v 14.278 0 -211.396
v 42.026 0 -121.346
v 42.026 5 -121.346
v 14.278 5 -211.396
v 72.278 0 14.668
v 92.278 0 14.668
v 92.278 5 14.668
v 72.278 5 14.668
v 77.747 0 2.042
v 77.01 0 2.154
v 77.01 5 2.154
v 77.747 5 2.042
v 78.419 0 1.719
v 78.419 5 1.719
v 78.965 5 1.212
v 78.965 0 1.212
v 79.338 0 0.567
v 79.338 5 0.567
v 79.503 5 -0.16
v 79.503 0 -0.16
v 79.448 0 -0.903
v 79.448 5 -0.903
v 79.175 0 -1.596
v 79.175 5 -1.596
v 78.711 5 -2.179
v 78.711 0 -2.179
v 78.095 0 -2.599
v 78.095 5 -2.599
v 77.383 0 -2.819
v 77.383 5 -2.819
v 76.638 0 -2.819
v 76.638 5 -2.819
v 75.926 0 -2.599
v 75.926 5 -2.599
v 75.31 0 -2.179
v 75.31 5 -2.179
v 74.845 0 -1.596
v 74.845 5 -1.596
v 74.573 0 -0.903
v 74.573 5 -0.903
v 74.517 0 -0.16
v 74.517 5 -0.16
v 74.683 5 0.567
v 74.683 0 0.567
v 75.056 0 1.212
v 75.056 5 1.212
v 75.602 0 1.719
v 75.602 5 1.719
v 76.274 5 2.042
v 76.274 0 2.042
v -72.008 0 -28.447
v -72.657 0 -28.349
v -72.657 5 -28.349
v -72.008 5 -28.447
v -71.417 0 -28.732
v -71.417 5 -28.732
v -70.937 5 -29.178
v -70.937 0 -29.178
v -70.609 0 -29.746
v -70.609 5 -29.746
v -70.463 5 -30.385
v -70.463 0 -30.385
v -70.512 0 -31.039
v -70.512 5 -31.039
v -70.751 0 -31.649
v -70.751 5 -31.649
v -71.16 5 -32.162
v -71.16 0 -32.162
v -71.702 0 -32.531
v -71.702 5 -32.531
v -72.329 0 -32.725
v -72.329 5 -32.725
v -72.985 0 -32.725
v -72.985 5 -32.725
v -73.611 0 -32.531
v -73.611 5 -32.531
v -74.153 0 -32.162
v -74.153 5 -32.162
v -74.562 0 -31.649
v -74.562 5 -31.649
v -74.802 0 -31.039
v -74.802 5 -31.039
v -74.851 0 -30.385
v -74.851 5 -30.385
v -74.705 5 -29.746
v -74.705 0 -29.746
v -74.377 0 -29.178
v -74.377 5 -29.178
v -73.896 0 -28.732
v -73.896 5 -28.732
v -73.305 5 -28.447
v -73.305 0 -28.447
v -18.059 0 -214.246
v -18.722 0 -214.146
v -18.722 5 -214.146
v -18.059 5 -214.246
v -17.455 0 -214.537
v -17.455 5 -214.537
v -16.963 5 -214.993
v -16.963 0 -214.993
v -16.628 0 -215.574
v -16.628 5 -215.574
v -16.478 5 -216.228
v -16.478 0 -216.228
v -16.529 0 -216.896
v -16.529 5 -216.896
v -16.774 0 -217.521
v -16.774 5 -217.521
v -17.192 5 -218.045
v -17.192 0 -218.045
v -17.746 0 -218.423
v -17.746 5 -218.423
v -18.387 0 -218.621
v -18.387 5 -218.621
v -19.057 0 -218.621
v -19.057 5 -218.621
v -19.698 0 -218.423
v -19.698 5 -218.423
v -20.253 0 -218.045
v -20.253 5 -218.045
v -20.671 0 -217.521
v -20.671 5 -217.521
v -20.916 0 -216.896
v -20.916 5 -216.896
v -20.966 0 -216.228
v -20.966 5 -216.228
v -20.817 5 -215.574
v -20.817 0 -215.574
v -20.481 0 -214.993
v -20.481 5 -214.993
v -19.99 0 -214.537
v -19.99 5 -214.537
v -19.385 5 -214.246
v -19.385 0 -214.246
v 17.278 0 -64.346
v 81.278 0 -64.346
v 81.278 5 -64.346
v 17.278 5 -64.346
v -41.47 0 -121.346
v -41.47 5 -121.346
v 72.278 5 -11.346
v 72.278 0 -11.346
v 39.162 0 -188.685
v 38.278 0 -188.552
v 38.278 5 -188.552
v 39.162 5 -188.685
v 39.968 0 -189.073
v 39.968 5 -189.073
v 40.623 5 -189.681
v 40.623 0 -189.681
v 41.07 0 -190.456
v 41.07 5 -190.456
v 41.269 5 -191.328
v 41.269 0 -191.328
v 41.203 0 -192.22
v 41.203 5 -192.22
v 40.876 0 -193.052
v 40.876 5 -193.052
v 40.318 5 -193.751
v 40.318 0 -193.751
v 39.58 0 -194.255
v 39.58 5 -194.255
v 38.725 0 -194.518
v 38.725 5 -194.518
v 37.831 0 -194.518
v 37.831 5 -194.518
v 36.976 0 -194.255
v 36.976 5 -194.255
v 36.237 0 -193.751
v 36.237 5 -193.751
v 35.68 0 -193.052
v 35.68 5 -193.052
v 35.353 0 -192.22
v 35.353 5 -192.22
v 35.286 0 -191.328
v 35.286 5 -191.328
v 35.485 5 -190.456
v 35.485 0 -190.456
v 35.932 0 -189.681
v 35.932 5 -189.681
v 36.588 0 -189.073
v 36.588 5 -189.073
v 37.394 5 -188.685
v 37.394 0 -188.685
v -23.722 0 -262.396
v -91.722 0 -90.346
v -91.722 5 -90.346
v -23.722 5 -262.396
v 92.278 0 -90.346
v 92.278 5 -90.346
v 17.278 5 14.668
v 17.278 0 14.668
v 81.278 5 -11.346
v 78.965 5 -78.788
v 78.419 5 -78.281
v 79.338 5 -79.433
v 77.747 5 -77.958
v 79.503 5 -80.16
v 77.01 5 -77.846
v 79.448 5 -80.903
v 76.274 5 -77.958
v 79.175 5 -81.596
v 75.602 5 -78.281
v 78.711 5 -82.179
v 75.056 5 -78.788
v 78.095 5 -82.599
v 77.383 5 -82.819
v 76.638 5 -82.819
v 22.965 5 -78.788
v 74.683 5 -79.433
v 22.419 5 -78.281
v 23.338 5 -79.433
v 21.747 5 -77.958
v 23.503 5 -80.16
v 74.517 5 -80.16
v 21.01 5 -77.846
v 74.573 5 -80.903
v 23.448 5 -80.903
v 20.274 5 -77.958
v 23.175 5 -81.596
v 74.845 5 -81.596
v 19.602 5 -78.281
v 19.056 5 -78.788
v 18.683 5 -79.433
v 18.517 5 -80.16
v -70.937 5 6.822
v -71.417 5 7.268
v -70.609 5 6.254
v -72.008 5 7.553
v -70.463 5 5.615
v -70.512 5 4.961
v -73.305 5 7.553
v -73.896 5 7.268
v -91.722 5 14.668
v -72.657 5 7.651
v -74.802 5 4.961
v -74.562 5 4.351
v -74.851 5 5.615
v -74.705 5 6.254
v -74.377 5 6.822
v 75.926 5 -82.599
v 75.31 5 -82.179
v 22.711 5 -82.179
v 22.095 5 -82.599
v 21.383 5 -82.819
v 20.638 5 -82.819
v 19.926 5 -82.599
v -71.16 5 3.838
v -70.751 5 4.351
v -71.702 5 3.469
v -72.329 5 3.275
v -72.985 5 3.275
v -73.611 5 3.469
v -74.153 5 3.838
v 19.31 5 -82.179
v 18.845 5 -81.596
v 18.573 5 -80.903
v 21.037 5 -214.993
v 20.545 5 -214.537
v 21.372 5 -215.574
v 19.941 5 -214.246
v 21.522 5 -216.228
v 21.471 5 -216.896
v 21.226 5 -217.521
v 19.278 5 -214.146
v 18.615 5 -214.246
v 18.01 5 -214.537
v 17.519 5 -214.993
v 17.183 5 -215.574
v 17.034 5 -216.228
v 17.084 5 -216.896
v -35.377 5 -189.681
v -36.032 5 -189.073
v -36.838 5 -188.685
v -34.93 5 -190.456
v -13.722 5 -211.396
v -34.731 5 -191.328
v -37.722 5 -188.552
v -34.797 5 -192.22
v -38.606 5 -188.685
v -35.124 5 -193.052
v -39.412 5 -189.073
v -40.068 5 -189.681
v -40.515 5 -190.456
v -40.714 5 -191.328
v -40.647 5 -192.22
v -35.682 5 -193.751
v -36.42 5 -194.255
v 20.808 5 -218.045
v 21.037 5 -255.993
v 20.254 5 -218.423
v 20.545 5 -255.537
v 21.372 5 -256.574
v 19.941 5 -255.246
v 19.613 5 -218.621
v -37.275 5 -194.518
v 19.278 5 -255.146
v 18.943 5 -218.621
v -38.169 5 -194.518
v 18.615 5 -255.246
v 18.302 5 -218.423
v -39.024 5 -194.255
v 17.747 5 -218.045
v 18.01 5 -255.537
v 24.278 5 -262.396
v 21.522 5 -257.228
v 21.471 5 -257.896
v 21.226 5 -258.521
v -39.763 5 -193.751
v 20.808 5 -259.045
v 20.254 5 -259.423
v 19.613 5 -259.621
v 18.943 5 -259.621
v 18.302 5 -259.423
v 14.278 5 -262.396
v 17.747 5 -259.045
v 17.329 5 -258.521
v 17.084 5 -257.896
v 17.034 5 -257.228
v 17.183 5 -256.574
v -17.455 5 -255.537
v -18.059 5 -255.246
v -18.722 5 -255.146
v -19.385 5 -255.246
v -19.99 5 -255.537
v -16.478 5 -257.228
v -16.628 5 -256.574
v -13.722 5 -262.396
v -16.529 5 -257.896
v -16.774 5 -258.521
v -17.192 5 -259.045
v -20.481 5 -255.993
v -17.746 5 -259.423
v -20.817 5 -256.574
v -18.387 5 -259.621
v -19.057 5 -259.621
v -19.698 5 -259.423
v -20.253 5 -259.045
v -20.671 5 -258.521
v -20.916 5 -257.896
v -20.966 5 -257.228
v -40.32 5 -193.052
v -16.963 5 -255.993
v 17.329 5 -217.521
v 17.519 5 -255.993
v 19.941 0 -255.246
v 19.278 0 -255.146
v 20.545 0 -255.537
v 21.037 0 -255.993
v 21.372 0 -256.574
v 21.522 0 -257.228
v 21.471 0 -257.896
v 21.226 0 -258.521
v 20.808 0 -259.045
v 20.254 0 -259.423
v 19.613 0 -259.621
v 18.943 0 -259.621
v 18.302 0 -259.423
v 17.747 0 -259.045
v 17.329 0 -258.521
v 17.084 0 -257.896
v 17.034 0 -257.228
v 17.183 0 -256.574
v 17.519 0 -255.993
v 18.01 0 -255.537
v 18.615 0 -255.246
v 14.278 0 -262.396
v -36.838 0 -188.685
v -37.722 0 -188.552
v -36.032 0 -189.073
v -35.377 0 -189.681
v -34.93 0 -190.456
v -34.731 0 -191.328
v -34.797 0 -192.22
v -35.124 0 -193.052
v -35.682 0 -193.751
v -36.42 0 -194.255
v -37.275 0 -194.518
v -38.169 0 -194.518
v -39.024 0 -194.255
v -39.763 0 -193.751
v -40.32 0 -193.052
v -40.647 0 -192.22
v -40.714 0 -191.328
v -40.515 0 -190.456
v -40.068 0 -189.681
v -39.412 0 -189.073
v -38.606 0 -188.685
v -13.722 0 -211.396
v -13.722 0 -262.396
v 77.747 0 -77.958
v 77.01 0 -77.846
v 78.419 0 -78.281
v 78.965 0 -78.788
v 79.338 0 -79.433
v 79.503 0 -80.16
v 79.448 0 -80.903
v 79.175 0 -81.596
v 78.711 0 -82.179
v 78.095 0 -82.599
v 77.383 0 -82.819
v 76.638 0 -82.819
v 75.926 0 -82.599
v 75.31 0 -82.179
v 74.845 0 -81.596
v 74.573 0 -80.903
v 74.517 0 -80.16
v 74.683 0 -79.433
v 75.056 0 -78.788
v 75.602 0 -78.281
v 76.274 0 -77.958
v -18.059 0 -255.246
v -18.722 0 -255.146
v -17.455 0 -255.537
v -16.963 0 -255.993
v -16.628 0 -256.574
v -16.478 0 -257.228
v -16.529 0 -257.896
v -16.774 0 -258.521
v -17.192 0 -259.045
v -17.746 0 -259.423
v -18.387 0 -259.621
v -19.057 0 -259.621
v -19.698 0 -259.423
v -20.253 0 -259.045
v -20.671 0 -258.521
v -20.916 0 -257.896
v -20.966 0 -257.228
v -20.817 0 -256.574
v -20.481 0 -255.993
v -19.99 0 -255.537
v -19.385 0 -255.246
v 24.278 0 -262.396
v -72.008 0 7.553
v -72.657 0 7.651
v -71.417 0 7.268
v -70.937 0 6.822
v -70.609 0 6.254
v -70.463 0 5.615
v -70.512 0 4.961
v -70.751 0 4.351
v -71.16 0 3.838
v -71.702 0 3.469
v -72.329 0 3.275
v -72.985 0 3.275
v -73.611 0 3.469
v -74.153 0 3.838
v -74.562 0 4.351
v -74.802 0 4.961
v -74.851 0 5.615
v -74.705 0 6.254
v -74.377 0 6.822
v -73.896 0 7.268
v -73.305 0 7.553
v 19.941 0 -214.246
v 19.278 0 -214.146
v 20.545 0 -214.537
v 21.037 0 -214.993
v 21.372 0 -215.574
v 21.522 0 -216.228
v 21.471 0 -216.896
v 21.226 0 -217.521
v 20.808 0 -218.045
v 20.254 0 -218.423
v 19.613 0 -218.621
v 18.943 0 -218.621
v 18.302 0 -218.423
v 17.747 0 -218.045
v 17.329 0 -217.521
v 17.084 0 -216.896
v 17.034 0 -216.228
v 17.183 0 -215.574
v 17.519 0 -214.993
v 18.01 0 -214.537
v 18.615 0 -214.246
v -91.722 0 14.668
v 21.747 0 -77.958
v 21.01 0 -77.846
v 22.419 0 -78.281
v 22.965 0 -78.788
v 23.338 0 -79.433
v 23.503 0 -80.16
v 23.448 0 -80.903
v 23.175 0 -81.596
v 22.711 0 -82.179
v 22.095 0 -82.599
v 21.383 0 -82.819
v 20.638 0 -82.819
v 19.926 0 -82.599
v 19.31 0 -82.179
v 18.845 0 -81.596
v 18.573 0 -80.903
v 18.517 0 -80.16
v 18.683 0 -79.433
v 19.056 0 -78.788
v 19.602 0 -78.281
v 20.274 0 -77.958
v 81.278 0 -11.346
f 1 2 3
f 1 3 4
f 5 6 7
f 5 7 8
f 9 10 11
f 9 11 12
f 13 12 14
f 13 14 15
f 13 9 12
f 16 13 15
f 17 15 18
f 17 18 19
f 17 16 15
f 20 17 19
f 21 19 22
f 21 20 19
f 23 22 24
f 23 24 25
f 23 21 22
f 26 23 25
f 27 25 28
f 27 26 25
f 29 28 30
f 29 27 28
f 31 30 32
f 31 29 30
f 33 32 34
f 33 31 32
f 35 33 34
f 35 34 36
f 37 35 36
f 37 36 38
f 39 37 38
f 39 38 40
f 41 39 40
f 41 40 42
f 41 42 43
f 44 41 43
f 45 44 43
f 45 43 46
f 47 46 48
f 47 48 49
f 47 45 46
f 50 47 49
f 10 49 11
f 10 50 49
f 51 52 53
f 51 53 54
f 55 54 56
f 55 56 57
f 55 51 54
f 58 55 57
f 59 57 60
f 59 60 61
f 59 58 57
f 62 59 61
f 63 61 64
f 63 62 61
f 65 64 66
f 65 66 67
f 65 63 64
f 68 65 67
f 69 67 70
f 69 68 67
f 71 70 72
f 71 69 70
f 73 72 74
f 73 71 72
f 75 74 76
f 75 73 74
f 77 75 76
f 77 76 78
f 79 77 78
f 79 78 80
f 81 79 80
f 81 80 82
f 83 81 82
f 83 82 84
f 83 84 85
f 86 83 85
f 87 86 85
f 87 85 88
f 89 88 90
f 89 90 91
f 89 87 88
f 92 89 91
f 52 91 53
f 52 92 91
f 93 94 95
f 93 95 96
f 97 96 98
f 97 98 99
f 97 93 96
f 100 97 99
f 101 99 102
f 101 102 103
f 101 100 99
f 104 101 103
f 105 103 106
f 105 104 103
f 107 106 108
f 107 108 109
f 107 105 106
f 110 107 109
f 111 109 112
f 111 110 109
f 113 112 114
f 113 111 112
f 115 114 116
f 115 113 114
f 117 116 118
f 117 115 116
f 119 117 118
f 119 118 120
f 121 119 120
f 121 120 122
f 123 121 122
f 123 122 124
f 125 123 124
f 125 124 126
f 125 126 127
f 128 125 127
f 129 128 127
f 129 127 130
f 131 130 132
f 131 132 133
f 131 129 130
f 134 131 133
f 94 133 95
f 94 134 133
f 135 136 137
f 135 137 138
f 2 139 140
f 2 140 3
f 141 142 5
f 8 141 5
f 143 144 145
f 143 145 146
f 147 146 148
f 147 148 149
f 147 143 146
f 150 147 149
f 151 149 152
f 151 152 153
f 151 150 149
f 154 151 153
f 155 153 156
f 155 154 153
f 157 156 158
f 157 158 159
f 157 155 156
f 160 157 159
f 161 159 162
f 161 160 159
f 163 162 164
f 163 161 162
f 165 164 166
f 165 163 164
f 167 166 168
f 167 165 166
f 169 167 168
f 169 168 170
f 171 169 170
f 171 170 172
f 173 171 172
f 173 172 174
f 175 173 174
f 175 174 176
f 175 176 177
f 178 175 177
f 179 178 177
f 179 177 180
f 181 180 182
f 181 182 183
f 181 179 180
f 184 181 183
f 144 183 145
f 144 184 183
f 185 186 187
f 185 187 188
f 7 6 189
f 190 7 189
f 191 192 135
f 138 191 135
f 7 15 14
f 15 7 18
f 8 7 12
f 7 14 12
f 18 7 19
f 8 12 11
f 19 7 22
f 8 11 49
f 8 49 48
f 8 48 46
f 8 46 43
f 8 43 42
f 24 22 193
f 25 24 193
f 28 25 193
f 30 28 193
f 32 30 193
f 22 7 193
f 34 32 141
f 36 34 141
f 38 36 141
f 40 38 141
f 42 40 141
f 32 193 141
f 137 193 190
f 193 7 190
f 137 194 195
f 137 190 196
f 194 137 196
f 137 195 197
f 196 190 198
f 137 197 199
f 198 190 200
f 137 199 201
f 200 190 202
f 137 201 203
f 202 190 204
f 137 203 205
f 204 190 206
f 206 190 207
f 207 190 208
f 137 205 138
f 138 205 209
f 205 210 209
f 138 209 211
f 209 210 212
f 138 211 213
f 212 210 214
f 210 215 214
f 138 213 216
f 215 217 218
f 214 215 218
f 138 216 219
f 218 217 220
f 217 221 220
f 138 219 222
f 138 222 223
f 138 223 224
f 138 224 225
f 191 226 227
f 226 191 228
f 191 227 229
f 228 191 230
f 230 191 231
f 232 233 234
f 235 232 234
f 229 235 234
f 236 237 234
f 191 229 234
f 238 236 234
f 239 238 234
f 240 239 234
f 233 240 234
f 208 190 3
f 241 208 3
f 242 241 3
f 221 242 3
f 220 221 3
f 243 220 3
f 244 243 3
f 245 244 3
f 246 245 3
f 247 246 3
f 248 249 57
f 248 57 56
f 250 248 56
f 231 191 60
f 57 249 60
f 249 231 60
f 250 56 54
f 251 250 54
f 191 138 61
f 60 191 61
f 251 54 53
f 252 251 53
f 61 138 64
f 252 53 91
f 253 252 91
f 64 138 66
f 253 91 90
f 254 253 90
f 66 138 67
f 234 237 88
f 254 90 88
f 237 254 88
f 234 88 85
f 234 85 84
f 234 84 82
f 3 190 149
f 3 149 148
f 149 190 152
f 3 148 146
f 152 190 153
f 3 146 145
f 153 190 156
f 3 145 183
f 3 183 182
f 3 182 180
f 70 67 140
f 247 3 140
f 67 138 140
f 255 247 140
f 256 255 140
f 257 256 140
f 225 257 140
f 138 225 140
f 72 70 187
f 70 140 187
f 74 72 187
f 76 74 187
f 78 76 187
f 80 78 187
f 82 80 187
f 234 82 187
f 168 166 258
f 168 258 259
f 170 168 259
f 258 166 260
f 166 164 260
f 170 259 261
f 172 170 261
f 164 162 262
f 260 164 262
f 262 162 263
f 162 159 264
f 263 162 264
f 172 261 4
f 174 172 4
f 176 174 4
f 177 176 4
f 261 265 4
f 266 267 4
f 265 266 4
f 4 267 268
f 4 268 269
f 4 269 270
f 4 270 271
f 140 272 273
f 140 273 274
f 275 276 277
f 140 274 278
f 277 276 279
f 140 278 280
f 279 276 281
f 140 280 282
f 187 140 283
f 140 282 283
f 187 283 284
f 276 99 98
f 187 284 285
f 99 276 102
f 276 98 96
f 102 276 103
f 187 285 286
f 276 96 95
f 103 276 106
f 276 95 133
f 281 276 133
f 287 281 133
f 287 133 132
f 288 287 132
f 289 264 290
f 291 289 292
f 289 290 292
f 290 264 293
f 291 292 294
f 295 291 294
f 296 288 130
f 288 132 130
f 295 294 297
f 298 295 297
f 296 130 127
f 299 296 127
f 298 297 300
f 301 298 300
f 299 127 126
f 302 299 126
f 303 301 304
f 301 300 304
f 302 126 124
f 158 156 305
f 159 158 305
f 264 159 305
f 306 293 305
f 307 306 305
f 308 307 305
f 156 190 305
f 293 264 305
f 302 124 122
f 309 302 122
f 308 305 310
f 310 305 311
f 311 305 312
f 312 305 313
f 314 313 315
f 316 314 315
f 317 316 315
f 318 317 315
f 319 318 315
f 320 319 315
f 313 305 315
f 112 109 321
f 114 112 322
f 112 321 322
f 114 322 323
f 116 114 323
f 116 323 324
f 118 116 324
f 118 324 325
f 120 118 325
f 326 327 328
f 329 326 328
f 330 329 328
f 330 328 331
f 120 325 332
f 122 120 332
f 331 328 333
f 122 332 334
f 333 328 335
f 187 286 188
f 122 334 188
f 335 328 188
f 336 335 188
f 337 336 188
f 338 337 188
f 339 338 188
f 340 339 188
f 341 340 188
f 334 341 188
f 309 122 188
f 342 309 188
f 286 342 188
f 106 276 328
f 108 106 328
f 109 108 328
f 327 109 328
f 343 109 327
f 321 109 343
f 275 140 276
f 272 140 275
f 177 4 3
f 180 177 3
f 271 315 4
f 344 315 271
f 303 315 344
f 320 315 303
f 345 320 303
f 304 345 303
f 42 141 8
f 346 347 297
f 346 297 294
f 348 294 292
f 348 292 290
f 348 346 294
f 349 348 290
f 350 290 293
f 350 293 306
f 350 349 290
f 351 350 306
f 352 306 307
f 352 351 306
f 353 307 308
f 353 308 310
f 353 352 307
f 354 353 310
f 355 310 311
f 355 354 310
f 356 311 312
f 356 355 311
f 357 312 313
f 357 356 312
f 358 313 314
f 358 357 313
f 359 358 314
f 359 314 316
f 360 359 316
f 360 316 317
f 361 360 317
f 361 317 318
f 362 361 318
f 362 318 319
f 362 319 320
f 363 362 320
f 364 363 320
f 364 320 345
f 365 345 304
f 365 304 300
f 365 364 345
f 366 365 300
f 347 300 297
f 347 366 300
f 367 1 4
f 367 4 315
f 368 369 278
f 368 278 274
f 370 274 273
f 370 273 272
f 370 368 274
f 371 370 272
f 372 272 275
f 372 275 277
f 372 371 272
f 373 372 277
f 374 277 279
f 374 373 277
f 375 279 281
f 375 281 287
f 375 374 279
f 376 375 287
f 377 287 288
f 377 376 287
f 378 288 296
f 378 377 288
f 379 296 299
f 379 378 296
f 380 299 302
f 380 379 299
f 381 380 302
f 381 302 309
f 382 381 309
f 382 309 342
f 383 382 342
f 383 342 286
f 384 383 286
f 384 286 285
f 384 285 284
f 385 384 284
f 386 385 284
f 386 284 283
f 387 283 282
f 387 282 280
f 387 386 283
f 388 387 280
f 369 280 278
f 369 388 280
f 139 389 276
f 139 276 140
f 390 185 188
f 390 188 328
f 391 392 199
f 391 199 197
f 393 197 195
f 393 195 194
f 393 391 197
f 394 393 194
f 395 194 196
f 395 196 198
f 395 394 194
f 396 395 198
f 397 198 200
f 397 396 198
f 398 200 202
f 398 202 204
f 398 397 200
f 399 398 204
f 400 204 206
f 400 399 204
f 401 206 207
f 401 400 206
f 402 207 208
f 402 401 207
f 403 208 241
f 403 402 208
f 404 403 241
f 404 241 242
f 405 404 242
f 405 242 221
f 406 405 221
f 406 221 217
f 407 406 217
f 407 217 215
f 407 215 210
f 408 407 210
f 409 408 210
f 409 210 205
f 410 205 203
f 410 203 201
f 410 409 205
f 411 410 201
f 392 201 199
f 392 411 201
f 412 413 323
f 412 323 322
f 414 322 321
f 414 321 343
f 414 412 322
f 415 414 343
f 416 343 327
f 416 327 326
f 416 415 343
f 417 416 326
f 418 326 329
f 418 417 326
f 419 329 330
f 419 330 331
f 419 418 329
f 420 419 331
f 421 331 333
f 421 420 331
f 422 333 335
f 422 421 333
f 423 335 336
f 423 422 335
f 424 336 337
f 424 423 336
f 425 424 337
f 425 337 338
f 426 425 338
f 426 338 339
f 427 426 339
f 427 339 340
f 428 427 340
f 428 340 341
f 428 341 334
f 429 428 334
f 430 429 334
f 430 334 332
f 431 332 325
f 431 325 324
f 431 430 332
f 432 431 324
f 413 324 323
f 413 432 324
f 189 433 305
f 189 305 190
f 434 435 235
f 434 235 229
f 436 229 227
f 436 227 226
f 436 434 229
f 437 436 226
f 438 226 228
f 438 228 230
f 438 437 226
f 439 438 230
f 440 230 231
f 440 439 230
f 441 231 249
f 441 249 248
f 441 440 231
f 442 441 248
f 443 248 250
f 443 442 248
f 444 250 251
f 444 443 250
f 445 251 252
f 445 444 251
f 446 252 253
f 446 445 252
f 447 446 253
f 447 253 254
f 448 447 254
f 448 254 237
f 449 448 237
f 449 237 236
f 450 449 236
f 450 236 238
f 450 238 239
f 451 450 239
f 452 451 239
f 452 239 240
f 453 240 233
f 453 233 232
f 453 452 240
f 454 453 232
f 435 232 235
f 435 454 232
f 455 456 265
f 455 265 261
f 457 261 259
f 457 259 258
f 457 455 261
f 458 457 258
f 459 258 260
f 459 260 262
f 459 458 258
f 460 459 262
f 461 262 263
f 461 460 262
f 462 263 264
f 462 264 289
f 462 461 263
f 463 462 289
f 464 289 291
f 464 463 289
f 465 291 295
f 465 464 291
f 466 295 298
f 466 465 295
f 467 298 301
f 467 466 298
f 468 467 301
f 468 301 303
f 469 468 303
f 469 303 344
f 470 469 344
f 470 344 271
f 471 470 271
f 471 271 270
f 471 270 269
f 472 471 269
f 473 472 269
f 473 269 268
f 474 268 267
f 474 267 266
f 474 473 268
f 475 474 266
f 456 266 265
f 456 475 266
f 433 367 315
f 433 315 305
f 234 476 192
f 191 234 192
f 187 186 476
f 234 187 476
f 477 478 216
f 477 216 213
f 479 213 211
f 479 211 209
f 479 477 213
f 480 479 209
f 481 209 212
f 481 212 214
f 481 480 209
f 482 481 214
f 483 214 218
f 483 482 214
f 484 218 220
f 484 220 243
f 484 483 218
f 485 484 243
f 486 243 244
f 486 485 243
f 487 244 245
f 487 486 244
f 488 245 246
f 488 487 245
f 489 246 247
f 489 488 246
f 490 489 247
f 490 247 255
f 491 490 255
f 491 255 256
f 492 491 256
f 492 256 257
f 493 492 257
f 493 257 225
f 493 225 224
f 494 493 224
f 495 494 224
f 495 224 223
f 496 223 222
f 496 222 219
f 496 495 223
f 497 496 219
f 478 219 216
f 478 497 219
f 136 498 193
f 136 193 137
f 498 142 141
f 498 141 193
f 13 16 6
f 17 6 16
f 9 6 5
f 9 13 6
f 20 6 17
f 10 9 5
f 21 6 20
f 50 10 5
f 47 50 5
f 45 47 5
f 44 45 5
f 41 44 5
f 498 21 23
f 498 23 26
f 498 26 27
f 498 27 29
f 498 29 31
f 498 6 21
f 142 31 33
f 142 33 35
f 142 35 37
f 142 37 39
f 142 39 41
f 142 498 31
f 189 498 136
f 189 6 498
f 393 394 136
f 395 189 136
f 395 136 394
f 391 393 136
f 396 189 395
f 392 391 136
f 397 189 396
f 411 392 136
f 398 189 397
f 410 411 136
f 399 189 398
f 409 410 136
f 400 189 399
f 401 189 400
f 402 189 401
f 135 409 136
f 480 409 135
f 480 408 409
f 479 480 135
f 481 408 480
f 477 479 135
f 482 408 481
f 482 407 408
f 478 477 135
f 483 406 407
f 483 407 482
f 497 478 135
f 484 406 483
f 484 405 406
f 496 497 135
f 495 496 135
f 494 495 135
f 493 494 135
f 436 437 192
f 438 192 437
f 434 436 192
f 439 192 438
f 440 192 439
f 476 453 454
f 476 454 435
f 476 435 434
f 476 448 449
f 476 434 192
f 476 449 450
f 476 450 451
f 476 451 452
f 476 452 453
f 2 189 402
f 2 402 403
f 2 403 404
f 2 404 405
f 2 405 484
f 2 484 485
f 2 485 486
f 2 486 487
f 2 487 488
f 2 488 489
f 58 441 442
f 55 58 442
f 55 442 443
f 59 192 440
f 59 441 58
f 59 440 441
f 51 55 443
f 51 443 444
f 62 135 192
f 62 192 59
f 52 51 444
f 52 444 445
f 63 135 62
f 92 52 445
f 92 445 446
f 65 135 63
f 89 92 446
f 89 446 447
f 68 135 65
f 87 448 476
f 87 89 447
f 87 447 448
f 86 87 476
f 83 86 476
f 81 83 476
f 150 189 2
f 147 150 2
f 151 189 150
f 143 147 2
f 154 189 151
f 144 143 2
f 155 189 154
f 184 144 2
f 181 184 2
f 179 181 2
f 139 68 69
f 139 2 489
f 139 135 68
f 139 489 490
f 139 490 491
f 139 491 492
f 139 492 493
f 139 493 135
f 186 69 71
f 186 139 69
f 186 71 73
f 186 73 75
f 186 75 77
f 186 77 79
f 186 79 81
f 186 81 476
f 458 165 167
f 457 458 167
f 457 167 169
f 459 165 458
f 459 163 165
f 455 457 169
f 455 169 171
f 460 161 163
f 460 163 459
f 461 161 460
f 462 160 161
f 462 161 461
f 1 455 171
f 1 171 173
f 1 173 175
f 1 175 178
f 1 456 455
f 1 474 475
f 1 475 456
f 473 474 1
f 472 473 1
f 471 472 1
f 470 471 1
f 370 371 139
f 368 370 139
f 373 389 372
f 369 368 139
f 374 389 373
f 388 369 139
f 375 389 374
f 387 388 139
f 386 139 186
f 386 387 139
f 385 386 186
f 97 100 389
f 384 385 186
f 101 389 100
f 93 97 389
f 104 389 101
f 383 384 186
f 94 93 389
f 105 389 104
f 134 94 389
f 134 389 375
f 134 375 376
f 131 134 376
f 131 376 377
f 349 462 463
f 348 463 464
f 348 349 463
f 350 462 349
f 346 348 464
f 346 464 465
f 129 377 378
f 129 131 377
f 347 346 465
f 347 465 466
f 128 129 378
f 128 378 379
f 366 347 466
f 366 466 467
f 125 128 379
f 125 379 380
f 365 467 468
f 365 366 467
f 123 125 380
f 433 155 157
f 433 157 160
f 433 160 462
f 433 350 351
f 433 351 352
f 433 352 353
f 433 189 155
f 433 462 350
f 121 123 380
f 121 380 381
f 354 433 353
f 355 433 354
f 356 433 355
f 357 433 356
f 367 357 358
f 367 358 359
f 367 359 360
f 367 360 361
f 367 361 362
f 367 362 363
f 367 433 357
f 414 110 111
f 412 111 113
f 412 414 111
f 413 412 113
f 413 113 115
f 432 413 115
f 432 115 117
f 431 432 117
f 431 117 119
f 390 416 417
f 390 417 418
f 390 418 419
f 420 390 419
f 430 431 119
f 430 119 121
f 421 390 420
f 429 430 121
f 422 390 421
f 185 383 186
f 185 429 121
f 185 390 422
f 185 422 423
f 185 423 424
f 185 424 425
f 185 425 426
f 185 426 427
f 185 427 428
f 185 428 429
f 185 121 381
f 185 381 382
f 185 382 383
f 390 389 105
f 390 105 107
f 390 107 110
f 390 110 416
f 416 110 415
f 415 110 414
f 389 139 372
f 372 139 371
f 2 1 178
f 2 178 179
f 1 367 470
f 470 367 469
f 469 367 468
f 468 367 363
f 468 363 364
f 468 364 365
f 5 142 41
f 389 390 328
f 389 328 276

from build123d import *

# Parameters (mm, degrees)
SKETCH1_R           = 2.5
SKETCH1_R_2         = 2.25
SKETCH1_R_3         = 3
SKETCH1_R_4         = 2.2
BOSS_EXTRUDE1_DEPTH = 5


with BuildPart() as part:
    # Sketch1 → Boss-Extrude1 (new body)
    with BuildSketch(Plane(origin=(0, 0, 0), x_dir=(1, 0, 0), z_dir=(0, 1, 0))):
        Polygon((-91.72214446, -4.653561253), (-91.72214446, 90.346388656), (-23.72214446, 262.395827557), (-13.72214446, 262.395827557), (-13.72214446, 211.395827557), (-41.469832452, 121.346438747), (42.025543532, 121.346438747), (14.27785554, 211.395827557), (14.27785554, 262.395827557), (24.27785554, 262.395827557), (92.27785554, 90.346388656), (92.27785554, -4.653561253), (92.27785554, -10.433561253), (92.27785554, -14.668275992), (72.27785554, -14.668275992), (72.27785554, -10.433561253), (72.27785554, -4.653561253), (72.27785554, 11.346431169), (81.27785554, 11.346431169), (81.27785554, 64.346431169), (17.277798113, 64.346431169), (17.277798113, -4.653561253), (17.277798113, -10.433561253), (17.277798113, -14.668275992), (-91.456714597, -14.668275992), (-91.72214446, -14.668275992), (-91.72214446, -10.433561253), align=None)
        with Locations(Location((77.010414368, 0.346438747, 0), (0, 0, 270))):
            Circle(SKETCH1_R, mode=Mode.SUBTRACT)
        with Locations(Location((77.010414368, 80.346438747, 0), (0, 0, 270))):
            Circle(SKETCH1_R, mode=Mode.SUBTRACT)
        with Locations(Location((21.010414368, 80.346438747, 0), (0, 0, 270))):
            Circle(SKETCH1_R, mode=Mode.SUBTRACT)
        with Locations(Location((-18.72214446, 257.395827557, 0), (0, 0, 270))):
            Circle(SKETCH1_R_2, mode=Mode.SUBTRACT)
        with Locations(Location((-18.72214446, 216.395827557, 0), (0, 0, 270))):
            Circle(SKETCH1_R_2, mode=Mode.SUBTRACT)
        with Locations(Location((19.27785554, 257.395827557, 0), (0, 0, 270))):
            Circle(SKETCH1_R_2, mode=Mode.SUBTRACT)
        with Locations(Location((19.27785554, 216.395827557, 0), (0, 0, 270))):
            Circle(SKETCH1_R_2, mode=Mode.SUBTRACT)
        with Locations(Location((-37.72214446, 191.551940951, 0), (0, 0, 270))):
            Circle(SKETCH1_R_3, mode=Mode.SUBTRACT)
        with Locations(Location((38.27785554, 191.551940951, 0), (0, 0, 270))):
            Circle(SKETCH1_R_3, mode=Mode.SUBTRACT)
        with Locations(Location((-72.656714597, -5.450648645, 0), (0, 0, 270))):
            Circle(SKETCH1_R_4, mode=Mode.SUBTRACT)
        with Locations(Location((-72.656714597, 30.549351355, 0), (0, 0, 270))):
            Circle(SKETCH1_R_4, mode=Mode.SUBTRACT)
    extrude(amount=BOSS_EXTRUDE1_DEPTH)


solid = part.part
